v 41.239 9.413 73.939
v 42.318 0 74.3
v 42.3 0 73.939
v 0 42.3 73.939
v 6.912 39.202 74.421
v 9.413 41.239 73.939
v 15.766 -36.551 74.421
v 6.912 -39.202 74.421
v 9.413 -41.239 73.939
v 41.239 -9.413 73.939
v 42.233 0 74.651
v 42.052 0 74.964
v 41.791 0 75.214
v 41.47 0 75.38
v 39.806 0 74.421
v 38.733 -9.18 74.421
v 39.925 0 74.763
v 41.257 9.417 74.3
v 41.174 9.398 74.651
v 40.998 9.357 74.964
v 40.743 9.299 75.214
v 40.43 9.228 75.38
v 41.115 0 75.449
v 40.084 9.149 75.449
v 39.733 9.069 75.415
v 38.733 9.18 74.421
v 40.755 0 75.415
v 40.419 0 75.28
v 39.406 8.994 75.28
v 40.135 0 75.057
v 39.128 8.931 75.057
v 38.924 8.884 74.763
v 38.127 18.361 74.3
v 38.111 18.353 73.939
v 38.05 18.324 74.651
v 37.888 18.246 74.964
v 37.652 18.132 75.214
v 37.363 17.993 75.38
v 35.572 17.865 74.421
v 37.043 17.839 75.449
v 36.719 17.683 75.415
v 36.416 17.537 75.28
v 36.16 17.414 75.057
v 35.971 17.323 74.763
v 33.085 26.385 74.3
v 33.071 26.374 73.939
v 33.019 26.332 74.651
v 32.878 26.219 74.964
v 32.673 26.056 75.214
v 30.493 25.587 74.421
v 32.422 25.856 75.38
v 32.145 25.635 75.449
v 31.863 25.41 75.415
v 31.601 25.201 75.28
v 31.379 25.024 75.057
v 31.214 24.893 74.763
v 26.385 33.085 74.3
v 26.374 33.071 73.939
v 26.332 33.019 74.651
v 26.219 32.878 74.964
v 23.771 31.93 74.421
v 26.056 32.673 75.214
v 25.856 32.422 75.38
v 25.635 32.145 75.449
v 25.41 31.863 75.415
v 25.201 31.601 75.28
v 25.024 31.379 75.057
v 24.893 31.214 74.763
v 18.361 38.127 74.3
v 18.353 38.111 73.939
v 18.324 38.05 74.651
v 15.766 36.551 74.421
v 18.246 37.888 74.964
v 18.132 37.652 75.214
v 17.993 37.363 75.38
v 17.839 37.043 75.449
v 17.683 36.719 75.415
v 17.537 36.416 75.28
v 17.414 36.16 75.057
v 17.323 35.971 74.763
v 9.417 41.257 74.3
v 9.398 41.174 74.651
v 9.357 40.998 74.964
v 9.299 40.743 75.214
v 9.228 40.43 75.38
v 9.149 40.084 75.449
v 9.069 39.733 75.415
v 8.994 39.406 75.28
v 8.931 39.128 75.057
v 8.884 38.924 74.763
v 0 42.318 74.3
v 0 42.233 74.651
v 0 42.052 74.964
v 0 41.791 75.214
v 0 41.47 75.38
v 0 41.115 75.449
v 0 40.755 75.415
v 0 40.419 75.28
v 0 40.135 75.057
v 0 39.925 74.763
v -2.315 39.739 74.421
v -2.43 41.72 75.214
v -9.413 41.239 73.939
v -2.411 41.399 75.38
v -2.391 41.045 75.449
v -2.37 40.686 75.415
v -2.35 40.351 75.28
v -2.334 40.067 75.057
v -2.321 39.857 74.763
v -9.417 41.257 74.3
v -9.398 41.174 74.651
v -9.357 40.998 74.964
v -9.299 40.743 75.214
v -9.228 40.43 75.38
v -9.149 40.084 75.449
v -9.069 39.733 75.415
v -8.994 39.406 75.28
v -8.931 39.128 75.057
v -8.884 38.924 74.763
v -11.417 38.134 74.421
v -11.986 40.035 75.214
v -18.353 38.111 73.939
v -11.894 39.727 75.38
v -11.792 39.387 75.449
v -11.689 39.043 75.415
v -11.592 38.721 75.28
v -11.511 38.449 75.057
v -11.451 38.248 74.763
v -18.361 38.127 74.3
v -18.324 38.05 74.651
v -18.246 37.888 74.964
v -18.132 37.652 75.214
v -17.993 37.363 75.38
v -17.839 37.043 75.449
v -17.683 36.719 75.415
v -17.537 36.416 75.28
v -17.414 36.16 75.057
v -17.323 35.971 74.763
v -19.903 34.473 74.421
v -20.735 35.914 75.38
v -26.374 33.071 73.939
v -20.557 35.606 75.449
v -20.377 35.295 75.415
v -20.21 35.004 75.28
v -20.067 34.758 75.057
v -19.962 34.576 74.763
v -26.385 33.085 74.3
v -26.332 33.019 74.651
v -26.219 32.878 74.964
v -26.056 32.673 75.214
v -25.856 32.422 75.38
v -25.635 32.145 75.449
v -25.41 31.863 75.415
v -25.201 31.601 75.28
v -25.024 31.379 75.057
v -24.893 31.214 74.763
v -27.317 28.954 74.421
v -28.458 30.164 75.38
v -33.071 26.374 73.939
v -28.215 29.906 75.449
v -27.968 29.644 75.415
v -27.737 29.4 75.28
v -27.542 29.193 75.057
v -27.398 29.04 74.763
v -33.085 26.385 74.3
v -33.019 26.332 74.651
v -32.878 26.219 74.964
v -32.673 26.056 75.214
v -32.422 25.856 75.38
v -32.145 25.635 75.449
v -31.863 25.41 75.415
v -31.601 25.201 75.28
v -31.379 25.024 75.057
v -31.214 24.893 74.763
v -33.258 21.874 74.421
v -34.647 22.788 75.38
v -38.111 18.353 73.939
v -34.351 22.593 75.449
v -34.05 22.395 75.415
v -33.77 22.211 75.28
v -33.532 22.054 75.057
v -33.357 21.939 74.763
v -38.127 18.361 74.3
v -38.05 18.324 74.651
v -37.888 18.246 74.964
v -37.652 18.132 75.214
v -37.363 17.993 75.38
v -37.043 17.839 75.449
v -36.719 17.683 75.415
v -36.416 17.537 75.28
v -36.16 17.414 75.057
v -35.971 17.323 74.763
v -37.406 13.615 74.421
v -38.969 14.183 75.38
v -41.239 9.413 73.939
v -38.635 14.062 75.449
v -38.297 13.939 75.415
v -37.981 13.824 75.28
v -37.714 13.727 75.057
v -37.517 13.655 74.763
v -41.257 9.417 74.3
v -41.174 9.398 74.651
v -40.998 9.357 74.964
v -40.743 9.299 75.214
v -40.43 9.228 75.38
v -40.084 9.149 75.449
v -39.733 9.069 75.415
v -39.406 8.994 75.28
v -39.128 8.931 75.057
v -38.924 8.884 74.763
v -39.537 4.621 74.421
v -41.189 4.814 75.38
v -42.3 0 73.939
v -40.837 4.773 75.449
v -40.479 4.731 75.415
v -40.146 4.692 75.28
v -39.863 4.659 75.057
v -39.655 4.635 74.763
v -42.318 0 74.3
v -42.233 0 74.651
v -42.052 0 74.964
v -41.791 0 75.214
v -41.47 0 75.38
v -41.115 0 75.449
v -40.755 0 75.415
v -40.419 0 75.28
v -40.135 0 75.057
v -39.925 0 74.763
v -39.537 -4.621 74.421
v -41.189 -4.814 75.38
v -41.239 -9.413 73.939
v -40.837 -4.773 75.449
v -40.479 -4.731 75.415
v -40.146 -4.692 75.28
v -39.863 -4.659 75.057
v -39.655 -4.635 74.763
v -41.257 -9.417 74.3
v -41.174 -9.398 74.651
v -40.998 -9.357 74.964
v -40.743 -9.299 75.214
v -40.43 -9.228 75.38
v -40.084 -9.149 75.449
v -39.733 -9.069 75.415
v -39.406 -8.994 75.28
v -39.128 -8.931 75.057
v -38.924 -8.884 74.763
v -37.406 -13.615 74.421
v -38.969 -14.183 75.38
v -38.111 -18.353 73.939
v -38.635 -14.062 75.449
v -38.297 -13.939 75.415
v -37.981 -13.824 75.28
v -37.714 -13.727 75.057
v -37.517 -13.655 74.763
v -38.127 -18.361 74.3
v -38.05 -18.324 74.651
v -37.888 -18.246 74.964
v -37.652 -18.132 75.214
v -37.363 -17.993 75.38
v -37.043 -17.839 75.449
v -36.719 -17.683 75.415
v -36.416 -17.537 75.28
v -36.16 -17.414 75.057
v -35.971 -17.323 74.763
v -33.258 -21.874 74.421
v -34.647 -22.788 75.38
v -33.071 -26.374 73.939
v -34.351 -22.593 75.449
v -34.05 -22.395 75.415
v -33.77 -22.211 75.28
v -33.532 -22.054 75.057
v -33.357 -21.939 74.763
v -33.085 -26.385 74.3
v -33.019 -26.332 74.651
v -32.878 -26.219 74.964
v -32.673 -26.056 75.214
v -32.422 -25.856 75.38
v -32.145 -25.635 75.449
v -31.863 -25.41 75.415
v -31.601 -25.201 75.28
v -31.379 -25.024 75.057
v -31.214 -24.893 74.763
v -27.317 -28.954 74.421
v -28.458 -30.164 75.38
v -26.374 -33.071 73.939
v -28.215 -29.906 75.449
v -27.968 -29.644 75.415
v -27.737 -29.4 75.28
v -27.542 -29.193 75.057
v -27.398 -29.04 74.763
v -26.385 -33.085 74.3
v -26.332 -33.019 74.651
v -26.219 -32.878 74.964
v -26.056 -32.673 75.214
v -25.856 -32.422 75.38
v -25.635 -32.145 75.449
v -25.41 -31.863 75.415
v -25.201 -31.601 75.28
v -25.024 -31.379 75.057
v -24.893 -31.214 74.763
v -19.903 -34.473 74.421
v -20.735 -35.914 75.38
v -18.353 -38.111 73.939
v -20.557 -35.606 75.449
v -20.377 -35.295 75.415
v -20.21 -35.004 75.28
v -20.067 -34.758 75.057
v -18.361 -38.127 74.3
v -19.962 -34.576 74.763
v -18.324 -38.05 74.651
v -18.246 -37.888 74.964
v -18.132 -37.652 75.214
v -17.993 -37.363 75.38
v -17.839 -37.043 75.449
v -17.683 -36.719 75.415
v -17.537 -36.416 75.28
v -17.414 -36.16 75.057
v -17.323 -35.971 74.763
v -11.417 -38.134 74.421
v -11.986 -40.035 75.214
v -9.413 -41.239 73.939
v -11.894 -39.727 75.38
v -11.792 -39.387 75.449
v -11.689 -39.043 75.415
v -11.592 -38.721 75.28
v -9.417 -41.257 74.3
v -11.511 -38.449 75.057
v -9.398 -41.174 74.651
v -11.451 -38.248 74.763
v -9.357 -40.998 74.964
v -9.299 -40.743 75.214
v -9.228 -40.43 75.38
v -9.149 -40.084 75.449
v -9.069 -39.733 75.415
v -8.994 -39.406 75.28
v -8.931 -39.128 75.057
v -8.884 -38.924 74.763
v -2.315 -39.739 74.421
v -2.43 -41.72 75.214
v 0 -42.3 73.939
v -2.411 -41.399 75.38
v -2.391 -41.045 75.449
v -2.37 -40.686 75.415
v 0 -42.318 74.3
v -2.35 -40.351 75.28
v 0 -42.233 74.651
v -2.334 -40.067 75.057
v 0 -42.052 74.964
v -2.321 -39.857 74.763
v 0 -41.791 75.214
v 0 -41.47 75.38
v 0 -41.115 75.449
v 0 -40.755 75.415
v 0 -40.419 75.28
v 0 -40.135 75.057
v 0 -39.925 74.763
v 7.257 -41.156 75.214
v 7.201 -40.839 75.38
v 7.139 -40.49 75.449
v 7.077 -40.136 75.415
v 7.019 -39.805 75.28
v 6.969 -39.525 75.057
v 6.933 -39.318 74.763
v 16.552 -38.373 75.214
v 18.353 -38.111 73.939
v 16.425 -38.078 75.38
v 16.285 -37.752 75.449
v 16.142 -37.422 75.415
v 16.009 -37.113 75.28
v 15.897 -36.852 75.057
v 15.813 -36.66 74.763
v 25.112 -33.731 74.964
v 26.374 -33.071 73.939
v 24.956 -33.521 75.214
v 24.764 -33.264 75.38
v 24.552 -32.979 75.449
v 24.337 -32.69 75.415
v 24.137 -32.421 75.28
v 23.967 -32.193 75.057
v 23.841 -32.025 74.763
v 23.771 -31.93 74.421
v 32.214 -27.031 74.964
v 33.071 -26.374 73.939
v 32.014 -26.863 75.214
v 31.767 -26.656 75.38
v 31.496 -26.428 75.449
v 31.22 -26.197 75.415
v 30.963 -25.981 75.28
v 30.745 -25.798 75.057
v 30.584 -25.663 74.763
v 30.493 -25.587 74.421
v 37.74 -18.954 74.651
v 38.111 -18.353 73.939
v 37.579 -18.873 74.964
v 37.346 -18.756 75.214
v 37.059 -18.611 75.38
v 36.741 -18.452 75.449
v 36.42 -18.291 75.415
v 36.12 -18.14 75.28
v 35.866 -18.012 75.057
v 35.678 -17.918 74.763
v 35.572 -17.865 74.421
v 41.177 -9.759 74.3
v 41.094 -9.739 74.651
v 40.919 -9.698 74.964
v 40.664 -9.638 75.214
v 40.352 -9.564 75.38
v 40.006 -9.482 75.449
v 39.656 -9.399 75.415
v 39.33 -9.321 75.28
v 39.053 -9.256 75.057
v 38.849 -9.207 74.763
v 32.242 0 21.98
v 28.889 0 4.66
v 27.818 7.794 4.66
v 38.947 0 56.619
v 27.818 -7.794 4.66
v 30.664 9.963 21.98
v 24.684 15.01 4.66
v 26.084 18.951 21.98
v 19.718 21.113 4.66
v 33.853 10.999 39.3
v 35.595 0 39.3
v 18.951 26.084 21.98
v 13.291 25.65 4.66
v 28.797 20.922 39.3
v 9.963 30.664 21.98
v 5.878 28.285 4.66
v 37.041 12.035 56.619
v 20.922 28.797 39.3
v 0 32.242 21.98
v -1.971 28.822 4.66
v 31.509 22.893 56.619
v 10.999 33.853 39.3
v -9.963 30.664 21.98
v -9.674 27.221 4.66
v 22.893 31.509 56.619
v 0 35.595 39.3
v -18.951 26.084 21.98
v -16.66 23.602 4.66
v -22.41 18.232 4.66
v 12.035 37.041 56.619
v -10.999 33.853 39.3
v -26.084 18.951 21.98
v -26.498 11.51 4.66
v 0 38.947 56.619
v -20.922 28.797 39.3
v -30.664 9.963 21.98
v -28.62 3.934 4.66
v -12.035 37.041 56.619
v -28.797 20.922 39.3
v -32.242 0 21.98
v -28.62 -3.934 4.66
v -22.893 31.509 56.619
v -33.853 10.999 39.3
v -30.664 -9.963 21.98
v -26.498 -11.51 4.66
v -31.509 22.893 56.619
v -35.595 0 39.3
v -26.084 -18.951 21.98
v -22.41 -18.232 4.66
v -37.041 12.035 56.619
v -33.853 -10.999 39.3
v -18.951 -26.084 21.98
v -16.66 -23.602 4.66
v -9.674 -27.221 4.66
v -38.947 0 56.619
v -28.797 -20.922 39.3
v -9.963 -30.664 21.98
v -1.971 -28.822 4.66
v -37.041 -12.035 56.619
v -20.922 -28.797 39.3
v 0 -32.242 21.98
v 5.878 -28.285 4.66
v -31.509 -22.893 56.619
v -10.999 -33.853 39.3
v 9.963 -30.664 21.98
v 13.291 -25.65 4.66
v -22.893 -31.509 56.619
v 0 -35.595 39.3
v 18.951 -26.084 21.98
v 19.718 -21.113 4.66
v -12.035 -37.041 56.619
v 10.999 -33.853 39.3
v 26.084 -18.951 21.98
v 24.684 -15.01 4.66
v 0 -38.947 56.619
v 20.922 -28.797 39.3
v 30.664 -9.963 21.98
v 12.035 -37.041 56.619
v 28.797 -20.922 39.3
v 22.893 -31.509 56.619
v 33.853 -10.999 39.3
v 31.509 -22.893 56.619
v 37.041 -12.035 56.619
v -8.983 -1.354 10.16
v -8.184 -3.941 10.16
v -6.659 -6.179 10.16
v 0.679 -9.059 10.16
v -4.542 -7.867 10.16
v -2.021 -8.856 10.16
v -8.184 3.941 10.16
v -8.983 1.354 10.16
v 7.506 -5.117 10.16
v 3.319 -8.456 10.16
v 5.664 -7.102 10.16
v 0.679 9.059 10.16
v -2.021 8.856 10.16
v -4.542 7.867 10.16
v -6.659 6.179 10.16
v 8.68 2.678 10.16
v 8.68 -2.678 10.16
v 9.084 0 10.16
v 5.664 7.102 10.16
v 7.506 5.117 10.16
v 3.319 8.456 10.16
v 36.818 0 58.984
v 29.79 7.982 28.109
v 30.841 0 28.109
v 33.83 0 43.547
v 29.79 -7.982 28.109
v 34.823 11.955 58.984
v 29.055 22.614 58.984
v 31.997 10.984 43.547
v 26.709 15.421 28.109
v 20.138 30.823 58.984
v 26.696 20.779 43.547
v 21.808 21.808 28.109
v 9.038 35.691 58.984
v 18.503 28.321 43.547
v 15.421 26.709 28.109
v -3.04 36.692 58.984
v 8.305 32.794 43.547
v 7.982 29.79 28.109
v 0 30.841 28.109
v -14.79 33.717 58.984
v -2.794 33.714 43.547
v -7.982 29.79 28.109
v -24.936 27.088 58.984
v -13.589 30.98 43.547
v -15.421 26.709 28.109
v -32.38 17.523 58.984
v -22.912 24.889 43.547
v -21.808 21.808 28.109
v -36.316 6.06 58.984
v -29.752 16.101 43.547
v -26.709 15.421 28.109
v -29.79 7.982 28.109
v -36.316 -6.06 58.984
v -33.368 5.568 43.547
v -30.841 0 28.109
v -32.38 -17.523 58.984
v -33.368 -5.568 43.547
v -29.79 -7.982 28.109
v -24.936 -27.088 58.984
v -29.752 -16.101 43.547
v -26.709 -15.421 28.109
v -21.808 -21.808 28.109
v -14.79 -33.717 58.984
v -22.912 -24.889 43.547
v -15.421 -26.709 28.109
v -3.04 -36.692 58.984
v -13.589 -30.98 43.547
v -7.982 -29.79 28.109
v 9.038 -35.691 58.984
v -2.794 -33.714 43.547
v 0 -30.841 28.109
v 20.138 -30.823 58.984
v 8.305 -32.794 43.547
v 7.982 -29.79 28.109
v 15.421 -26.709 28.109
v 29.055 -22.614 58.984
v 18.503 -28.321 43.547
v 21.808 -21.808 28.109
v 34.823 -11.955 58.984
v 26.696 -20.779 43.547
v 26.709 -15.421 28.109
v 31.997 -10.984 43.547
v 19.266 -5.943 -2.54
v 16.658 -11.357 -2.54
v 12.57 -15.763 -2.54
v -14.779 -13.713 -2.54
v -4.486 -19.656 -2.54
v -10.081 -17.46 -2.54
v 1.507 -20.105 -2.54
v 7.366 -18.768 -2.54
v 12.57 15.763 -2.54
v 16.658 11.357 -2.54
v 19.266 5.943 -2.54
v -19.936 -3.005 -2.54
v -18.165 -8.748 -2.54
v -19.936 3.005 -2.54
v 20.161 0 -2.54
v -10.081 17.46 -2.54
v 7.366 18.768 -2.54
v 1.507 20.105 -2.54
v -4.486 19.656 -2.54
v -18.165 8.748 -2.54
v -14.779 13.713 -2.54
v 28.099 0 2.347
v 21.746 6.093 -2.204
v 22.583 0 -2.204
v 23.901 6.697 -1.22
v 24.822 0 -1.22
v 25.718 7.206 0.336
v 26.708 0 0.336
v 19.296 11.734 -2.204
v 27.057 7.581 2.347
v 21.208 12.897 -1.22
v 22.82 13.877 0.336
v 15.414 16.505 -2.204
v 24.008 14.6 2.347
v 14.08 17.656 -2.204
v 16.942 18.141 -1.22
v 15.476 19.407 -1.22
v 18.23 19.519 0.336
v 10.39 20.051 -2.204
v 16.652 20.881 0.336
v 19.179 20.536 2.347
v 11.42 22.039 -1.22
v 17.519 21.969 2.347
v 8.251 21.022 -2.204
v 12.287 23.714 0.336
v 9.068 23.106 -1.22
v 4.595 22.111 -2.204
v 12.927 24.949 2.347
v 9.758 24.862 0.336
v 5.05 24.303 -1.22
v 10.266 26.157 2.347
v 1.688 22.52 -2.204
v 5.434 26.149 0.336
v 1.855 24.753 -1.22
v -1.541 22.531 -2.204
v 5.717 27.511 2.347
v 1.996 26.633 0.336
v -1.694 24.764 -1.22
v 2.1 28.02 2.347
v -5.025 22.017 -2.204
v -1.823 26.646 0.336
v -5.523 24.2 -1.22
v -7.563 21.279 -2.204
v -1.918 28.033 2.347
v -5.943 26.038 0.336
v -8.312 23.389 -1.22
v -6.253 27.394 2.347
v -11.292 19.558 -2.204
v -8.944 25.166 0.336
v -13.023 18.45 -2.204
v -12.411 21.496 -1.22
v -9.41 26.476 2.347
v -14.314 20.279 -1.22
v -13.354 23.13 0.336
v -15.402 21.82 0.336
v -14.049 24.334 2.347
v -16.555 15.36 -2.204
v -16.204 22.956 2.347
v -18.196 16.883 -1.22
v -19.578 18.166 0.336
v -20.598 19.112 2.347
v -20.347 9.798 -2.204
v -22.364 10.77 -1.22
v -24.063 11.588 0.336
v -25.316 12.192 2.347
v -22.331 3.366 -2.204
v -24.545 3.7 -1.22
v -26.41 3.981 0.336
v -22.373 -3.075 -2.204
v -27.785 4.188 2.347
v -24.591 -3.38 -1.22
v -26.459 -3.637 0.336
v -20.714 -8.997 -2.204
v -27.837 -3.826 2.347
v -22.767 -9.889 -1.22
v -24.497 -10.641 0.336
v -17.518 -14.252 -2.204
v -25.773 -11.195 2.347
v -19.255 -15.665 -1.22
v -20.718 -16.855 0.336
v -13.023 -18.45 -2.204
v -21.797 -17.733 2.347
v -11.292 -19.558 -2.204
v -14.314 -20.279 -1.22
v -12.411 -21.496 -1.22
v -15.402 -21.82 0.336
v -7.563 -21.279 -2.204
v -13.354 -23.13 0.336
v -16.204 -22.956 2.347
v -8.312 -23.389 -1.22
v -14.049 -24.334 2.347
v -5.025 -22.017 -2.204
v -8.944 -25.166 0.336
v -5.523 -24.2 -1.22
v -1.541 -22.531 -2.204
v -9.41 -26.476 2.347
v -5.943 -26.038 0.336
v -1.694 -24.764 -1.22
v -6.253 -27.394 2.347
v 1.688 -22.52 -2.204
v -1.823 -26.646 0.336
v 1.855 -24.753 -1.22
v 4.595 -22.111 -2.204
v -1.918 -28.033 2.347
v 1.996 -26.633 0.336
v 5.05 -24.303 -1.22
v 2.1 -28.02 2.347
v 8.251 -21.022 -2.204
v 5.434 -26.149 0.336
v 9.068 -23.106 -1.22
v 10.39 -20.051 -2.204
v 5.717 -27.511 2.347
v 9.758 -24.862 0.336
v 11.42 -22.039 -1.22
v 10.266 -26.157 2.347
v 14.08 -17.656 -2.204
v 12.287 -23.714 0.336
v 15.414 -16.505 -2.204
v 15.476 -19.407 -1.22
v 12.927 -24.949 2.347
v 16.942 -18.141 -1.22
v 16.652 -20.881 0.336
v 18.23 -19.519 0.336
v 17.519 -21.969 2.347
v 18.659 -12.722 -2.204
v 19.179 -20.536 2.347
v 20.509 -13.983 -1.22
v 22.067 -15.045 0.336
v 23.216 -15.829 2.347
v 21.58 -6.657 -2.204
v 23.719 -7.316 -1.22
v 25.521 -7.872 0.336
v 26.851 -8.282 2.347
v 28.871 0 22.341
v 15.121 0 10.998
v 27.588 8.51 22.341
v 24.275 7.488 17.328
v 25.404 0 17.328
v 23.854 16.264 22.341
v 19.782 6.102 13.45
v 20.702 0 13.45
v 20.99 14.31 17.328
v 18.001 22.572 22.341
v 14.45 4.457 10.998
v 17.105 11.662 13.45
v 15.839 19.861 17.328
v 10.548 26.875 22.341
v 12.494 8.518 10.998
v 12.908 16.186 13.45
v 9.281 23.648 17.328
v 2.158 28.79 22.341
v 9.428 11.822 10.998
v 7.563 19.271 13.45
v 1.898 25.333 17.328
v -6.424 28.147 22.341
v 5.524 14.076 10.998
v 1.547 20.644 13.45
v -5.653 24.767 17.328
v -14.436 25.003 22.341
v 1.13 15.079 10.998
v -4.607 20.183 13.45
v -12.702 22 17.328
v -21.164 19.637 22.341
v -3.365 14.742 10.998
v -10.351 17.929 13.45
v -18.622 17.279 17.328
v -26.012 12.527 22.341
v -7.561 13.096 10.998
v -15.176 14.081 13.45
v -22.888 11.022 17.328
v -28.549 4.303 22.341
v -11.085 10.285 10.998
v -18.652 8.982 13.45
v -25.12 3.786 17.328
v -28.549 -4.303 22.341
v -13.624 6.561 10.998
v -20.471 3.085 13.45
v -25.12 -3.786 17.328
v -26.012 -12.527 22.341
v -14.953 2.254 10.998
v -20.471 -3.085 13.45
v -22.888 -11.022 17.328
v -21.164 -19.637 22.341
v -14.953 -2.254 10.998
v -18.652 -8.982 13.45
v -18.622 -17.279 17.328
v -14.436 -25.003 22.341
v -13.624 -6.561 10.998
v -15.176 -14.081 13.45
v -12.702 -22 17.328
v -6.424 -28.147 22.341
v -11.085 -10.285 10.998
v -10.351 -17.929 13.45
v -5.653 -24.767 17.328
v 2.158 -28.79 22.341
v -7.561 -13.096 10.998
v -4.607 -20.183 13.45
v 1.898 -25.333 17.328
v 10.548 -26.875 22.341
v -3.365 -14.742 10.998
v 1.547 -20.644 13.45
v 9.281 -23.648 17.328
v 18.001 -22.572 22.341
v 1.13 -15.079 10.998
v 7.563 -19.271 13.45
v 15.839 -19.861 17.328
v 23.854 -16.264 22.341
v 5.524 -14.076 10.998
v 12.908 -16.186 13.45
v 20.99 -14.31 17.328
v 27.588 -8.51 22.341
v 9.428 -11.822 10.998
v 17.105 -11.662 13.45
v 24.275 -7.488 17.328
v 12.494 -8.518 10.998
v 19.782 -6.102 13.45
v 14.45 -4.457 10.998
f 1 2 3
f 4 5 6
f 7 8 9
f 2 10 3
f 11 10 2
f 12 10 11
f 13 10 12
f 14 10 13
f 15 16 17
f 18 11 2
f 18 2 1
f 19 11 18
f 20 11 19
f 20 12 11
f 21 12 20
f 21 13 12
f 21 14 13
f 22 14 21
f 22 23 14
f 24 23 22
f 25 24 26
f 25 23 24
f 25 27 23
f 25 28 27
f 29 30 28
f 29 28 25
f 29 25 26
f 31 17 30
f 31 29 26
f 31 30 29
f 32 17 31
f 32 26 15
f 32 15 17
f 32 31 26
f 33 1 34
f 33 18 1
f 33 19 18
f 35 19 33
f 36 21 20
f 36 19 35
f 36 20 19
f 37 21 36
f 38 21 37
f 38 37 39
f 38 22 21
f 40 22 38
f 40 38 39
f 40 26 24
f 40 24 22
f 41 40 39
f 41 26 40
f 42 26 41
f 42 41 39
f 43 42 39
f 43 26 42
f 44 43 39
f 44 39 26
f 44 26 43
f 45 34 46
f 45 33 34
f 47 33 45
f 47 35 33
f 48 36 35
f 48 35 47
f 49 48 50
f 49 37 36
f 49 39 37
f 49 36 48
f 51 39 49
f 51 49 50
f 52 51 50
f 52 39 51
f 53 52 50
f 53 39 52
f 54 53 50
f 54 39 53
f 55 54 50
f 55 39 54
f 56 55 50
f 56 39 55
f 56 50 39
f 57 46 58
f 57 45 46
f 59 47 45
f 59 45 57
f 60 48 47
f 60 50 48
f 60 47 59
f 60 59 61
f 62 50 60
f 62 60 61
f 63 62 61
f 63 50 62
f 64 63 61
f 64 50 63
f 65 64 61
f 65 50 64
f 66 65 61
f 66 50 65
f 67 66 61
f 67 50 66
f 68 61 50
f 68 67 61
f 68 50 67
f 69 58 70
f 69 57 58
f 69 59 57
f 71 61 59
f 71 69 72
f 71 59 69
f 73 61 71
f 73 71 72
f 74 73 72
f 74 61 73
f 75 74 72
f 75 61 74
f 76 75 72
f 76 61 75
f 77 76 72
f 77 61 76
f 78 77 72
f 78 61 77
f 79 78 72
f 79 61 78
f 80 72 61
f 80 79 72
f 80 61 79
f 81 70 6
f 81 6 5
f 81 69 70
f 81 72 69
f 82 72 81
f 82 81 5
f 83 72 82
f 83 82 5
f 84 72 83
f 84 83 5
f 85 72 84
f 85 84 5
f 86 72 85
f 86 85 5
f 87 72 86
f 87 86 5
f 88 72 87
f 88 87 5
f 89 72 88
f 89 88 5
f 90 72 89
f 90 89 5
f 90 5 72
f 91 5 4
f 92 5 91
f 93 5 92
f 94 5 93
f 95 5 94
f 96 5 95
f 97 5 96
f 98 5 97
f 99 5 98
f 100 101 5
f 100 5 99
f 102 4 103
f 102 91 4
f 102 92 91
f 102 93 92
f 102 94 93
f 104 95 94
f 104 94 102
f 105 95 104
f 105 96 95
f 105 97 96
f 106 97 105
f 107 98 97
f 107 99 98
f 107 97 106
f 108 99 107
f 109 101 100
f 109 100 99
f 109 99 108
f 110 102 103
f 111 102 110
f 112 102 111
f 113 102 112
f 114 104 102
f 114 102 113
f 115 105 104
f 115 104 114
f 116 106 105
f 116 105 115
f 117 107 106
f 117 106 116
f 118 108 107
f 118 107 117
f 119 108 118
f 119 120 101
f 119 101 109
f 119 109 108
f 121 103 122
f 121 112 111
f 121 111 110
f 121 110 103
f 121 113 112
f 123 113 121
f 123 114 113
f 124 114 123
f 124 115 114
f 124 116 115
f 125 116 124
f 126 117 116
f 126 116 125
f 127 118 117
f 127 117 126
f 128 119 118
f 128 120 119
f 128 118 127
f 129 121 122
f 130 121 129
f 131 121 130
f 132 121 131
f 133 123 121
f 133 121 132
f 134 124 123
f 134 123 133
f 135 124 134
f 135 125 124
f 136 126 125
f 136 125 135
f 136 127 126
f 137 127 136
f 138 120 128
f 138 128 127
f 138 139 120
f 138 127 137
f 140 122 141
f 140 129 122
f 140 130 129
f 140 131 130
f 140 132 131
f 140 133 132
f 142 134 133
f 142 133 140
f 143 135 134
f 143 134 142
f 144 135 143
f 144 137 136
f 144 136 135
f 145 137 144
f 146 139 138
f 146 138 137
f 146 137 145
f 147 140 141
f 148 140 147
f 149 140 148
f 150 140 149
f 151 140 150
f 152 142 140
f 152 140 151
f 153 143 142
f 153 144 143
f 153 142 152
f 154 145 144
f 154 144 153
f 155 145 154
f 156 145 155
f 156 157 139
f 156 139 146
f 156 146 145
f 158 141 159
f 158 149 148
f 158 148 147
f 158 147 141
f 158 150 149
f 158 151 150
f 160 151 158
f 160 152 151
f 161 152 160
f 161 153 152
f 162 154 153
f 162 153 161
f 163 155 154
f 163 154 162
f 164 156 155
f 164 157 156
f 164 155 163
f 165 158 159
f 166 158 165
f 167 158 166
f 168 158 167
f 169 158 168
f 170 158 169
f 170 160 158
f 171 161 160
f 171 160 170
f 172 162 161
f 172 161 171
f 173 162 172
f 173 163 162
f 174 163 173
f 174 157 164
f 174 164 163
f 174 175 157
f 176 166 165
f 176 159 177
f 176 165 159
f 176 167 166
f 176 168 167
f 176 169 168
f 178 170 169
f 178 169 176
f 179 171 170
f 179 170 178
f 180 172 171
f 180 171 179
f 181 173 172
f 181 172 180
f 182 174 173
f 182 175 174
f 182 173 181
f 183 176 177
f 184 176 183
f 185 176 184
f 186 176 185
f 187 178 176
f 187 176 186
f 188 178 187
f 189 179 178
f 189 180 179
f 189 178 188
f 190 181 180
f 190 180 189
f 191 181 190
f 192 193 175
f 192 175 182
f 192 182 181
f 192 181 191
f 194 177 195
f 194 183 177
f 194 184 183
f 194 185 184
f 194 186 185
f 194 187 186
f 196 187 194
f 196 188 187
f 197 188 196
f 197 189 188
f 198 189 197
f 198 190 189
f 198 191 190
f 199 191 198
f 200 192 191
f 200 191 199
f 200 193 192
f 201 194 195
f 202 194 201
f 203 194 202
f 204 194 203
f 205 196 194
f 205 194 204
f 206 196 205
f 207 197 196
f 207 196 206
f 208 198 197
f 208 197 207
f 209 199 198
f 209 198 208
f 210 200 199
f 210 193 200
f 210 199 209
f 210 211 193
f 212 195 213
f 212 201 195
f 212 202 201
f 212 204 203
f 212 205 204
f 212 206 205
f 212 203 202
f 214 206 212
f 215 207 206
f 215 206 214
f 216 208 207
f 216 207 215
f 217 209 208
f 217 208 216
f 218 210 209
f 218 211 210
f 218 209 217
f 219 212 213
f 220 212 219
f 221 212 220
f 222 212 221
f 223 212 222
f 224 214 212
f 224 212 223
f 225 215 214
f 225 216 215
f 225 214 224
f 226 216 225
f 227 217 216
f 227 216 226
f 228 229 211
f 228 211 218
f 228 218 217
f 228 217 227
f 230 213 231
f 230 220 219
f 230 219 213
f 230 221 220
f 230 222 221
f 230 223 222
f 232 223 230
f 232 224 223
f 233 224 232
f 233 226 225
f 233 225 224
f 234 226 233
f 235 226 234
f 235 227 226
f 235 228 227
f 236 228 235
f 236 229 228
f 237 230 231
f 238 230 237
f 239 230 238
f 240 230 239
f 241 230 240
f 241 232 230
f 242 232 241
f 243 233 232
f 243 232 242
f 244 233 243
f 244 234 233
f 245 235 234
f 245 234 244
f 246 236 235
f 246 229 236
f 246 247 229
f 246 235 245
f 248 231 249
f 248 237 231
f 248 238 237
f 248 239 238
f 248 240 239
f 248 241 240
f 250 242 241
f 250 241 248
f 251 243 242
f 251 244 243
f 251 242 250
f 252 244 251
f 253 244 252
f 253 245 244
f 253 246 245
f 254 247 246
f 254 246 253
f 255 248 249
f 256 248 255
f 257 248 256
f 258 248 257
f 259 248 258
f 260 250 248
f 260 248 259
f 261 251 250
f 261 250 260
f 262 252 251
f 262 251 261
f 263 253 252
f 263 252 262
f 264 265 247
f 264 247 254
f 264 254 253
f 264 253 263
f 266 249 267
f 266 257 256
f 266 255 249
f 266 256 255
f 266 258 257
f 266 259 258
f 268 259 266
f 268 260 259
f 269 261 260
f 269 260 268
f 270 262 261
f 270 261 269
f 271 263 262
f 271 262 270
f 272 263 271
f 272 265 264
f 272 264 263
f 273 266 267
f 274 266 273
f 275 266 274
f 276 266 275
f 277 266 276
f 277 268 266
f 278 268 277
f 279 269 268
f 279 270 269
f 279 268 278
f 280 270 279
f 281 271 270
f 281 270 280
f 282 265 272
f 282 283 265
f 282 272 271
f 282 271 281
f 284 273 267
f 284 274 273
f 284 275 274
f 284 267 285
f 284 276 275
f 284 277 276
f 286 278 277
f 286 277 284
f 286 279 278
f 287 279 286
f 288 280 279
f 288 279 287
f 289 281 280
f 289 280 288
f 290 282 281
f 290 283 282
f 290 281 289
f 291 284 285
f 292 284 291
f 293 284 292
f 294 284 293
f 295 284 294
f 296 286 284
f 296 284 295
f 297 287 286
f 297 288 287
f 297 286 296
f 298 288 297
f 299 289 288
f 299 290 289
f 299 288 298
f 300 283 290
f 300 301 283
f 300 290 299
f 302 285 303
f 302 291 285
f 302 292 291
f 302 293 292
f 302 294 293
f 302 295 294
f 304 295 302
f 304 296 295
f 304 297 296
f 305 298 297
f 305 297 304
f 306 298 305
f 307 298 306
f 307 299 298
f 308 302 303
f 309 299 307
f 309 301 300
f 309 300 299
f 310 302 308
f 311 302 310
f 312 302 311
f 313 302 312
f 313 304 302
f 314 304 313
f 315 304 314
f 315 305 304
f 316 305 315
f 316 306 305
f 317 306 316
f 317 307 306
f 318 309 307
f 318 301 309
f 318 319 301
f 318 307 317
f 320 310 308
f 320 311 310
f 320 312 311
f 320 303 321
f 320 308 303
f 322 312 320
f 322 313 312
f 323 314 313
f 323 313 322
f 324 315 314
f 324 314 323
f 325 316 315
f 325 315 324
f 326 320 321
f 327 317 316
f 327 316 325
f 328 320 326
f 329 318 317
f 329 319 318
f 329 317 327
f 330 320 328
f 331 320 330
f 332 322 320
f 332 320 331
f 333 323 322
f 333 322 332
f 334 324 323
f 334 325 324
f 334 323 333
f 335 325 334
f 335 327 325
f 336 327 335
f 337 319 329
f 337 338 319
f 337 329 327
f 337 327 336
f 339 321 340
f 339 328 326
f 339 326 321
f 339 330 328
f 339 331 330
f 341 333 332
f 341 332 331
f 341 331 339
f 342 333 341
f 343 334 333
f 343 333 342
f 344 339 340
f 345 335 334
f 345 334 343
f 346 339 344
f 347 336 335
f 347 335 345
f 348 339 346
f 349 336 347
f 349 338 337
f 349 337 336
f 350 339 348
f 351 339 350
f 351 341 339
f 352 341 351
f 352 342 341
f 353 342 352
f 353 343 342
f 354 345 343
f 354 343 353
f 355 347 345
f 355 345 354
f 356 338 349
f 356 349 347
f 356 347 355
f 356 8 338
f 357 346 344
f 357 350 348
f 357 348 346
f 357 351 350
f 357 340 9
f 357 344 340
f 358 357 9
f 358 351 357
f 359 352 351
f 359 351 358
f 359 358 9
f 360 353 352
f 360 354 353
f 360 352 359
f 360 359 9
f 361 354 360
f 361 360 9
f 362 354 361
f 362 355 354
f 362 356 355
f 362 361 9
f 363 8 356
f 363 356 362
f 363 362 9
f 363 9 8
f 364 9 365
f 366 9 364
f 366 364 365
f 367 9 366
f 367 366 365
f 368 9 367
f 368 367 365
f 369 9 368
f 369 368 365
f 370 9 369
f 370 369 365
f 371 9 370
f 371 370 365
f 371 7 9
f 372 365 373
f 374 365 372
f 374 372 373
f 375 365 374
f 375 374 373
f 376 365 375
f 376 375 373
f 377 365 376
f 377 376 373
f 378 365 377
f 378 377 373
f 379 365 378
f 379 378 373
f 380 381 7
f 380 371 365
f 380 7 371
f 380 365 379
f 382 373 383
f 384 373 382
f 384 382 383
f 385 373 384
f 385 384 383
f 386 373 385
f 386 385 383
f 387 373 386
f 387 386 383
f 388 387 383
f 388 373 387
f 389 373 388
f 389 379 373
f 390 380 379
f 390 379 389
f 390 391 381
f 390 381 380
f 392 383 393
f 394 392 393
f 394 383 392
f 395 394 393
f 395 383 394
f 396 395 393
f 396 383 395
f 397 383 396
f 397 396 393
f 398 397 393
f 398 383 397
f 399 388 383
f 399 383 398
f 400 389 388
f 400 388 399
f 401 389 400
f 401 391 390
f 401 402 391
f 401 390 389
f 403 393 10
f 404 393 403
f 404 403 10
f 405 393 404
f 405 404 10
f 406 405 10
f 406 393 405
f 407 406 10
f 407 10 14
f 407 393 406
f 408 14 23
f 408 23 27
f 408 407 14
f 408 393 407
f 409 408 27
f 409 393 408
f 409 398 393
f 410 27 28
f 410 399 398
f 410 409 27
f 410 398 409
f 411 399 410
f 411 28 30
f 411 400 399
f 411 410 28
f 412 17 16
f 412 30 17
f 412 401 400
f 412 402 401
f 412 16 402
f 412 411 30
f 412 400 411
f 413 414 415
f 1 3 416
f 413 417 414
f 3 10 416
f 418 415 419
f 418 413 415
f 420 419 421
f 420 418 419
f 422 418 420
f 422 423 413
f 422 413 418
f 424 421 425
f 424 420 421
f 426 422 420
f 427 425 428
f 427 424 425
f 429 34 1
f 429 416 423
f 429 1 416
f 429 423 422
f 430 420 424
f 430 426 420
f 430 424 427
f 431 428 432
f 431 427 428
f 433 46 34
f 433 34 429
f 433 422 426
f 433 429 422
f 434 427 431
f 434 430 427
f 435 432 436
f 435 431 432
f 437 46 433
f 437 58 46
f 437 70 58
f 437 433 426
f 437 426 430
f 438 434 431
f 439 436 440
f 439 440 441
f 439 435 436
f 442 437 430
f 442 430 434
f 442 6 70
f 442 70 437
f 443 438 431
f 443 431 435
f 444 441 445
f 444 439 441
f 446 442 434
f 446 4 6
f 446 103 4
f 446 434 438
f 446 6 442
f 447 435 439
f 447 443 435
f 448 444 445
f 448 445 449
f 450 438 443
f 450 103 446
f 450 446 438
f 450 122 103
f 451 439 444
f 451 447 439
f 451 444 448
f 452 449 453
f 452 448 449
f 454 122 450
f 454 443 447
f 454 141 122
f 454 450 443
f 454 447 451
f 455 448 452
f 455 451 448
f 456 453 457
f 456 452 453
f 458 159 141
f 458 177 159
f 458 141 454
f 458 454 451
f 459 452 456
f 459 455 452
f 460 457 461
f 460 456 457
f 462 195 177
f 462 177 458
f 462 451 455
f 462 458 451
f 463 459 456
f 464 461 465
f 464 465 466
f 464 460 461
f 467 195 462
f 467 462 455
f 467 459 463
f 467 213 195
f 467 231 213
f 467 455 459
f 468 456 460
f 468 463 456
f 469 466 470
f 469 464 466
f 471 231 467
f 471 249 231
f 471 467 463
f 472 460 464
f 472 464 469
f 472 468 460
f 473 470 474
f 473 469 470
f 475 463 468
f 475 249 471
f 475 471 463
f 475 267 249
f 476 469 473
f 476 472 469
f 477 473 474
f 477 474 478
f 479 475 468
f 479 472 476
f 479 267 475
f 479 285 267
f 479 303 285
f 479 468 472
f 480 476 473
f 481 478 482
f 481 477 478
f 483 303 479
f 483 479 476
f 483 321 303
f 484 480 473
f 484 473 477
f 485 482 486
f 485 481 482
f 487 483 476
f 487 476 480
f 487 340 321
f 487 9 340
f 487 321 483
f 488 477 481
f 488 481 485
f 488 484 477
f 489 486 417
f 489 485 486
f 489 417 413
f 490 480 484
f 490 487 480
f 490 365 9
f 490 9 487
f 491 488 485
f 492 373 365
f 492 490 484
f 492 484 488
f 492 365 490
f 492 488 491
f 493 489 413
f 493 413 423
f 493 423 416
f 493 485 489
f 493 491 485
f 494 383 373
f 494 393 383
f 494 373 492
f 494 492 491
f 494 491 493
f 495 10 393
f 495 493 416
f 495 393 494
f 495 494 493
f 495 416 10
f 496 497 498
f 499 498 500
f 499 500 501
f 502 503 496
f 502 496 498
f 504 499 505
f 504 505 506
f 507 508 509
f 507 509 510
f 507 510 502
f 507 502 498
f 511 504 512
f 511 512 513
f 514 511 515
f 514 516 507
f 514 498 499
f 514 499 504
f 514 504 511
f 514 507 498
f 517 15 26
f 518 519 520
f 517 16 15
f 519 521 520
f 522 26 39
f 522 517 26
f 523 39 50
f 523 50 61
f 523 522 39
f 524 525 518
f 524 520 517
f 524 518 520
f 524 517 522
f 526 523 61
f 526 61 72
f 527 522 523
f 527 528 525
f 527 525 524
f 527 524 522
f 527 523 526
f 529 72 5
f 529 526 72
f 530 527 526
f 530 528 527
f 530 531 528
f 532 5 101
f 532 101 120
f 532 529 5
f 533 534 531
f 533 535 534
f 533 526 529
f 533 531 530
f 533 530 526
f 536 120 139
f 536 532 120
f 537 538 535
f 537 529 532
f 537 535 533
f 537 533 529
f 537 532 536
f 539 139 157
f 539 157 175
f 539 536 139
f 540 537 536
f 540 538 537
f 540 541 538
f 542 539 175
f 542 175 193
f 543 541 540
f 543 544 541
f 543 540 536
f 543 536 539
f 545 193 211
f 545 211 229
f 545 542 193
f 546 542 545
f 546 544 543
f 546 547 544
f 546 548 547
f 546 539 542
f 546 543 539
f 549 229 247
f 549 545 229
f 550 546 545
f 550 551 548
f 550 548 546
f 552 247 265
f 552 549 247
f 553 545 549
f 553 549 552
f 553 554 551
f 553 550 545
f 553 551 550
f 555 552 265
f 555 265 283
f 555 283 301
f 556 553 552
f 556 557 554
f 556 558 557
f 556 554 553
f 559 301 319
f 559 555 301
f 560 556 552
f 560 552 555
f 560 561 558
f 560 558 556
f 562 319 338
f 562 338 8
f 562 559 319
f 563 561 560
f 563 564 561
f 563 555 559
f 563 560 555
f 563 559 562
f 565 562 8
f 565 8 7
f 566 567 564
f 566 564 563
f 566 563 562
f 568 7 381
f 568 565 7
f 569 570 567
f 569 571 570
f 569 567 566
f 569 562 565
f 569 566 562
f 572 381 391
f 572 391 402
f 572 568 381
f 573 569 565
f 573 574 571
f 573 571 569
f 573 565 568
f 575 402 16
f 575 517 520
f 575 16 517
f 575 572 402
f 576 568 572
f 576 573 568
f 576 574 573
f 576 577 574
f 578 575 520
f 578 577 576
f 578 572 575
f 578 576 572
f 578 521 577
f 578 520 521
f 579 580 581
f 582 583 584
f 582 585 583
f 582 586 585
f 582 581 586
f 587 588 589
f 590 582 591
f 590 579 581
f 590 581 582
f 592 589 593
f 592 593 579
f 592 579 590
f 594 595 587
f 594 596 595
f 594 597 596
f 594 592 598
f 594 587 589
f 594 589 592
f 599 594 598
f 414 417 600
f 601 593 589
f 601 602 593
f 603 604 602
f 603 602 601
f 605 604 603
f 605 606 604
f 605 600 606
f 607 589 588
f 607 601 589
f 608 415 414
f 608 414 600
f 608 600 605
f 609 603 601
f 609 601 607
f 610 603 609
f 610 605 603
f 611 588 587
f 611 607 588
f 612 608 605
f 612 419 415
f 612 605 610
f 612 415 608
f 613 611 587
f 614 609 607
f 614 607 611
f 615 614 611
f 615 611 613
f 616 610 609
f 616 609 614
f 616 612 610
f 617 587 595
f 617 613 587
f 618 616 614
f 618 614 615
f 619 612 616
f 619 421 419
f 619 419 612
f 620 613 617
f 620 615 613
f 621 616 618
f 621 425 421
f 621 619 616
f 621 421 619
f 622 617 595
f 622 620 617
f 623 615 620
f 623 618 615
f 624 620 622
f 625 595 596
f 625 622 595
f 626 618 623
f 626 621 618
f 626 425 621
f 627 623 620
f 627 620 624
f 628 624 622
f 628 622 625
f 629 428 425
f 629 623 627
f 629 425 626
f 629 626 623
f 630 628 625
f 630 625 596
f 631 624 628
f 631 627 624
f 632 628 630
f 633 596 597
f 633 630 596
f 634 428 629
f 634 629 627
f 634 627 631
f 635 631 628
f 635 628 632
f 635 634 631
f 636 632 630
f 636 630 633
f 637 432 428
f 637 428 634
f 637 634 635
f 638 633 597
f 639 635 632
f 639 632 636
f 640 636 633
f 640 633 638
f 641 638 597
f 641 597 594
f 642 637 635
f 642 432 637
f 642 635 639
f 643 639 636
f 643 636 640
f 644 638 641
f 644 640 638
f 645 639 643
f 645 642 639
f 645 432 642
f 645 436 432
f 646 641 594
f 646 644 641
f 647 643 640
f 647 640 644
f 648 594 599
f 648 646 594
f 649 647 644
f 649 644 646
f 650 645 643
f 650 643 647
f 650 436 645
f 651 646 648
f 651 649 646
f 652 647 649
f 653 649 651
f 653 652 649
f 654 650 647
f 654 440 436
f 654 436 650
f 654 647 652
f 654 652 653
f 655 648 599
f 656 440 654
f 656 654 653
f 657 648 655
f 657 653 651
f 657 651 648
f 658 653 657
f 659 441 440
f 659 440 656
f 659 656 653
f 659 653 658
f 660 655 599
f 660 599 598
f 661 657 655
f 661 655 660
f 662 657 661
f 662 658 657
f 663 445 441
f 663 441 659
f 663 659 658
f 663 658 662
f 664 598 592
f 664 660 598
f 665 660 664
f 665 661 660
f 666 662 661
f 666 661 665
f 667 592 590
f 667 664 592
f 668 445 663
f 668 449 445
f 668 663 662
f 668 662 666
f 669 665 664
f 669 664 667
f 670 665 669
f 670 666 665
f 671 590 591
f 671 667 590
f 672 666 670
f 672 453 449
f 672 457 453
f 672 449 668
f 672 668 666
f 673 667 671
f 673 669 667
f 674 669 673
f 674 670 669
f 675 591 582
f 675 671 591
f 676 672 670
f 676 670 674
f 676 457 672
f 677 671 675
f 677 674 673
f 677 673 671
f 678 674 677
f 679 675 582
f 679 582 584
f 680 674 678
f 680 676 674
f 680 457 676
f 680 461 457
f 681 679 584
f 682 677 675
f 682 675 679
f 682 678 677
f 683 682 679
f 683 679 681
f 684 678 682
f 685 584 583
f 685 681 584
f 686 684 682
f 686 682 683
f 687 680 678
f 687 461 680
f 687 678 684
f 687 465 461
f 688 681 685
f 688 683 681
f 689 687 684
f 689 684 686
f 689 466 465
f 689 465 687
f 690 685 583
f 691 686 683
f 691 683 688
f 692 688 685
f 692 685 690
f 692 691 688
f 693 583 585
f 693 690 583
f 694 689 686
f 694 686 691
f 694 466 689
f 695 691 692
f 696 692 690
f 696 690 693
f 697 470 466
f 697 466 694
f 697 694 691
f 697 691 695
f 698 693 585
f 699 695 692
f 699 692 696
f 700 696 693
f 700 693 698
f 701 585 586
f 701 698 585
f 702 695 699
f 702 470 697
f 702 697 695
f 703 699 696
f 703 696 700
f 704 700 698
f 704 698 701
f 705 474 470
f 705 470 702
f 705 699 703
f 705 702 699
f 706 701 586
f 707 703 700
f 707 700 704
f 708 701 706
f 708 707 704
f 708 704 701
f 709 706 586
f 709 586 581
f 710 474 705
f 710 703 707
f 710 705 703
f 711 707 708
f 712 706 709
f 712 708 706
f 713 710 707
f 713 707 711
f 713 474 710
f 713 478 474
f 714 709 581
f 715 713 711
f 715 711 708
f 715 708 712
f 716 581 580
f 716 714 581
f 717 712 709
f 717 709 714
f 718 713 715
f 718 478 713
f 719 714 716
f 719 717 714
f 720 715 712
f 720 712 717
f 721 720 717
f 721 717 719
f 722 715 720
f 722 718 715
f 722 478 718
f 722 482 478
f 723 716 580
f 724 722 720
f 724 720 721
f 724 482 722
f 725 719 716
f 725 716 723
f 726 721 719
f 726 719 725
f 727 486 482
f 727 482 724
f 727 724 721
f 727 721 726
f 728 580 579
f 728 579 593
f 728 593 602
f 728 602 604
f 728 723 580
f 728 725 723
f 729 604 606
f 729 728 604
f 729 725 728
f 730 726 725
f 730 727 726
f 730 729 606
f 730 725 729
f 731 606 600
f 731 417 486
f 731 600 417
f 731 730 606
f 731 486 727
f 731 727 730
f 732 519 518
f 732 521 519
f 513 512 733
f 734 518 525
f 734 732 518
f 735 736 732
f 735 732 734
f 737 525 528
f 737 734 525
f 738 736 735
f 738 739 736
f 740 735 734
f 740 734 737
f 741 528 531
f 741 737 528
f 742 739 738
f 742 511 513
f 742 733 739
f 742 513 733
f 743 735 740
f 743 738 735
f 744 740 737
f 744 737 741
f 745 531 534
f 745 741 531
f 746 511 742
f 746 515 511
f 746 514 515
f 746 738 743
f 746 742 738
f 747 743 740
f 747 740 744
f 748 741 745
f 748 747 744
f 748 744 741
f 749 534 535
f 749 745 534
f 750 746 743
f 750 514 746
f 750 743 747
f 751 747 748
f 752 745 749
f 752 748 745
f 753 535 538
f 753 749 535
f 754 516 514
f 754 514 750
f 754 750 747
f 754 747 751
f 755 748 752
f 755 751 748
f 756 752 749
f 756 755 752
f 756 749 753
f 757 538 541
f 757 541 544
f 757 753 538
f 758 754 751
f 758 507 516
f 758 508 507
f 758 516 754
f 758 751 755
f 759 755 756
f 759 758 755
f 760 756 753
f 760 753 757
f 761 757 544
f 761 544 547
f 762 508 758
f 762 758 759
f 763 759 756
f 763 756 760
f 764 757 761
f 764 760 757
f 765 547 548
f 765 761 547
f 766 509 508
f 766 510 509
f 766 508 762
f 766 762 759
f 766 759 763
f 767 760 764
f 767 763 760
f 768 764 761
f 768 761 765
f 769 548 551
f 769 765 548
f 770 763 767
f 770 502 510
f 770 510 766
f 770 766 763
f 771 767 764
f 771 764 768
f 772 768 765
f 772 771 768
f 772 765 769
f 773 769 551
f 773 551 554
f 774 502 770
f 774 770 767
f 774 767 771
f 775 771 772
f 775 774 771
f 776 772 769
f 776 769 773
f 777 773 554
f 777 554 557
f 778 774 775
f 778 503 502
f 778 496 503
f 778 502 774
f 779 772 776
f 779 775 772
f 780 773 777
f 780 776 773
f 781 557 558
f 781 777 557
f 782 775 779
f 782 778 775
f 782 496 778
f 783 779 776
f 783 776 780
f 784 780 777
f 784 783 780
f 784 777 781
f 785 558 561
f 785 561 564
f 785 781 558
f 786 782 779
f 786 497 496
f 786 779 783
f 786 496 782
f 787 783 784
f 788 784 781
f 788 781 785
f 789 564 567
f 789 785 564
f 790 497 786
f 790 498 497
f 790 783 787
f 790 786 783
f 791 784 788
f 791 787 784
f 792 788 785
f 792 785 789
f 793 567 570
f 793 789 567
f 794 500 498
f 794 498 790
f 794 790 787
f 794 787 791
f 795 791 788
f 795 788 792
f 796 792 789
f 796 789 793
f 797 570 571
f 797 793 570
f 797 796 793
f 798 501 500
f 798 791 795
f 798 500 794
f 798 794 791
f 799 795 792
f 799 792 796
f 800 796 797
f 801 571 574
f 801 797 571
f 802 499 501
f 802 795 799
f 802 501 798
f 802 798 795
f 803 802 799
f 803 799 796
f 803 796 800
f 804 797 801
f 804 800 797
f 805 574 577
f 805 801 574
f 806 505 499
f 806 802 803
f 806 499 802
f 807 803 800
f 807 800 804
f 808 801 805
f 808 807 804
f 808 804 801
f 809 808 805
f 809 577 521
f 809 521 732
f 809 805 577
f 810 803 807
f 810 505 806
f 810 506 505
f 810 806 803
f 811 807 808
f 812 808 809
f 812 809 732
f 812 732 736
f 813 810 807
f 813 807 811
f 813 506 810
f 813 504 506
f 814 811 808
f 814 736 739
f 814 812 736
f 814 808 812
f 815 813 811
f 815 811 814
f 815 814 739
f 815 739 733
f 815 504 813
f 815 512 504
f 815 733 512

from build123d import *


with BuildPart() as f1:
    # F0 (on Front) → F1 (revolve)
    with BuildSketch(Plane.XZ):
        with BuildLine():
            Line((39.8063, 74.421447), (30.841358, 28.109491))
            ThreePointArc((30.841358, 28.109491), (23.186924, 15.226532), (9.084044, 10.16))
            Line((9.084044, 10.16), (0, 10.16))
            Line((0, 10.16), (0, -2.54))
            Line((0, -2.54), (20.161336, -2.54))
            ThreePointArc((20.161336, -2.54), (25.818725, -0.507554), (28.889312, 4.660462))
            Line((28.889312, 4.660462), (42.300007, 73.938722))
            ThreePointArc((42.300007, 73.938722), (41.294516, 75.426938), (39.8063, 74.421447))
        make_face()
    revolve(axis=Axis((0, 0, 38.1), (0, 0, 1)))


solid = f1.part
